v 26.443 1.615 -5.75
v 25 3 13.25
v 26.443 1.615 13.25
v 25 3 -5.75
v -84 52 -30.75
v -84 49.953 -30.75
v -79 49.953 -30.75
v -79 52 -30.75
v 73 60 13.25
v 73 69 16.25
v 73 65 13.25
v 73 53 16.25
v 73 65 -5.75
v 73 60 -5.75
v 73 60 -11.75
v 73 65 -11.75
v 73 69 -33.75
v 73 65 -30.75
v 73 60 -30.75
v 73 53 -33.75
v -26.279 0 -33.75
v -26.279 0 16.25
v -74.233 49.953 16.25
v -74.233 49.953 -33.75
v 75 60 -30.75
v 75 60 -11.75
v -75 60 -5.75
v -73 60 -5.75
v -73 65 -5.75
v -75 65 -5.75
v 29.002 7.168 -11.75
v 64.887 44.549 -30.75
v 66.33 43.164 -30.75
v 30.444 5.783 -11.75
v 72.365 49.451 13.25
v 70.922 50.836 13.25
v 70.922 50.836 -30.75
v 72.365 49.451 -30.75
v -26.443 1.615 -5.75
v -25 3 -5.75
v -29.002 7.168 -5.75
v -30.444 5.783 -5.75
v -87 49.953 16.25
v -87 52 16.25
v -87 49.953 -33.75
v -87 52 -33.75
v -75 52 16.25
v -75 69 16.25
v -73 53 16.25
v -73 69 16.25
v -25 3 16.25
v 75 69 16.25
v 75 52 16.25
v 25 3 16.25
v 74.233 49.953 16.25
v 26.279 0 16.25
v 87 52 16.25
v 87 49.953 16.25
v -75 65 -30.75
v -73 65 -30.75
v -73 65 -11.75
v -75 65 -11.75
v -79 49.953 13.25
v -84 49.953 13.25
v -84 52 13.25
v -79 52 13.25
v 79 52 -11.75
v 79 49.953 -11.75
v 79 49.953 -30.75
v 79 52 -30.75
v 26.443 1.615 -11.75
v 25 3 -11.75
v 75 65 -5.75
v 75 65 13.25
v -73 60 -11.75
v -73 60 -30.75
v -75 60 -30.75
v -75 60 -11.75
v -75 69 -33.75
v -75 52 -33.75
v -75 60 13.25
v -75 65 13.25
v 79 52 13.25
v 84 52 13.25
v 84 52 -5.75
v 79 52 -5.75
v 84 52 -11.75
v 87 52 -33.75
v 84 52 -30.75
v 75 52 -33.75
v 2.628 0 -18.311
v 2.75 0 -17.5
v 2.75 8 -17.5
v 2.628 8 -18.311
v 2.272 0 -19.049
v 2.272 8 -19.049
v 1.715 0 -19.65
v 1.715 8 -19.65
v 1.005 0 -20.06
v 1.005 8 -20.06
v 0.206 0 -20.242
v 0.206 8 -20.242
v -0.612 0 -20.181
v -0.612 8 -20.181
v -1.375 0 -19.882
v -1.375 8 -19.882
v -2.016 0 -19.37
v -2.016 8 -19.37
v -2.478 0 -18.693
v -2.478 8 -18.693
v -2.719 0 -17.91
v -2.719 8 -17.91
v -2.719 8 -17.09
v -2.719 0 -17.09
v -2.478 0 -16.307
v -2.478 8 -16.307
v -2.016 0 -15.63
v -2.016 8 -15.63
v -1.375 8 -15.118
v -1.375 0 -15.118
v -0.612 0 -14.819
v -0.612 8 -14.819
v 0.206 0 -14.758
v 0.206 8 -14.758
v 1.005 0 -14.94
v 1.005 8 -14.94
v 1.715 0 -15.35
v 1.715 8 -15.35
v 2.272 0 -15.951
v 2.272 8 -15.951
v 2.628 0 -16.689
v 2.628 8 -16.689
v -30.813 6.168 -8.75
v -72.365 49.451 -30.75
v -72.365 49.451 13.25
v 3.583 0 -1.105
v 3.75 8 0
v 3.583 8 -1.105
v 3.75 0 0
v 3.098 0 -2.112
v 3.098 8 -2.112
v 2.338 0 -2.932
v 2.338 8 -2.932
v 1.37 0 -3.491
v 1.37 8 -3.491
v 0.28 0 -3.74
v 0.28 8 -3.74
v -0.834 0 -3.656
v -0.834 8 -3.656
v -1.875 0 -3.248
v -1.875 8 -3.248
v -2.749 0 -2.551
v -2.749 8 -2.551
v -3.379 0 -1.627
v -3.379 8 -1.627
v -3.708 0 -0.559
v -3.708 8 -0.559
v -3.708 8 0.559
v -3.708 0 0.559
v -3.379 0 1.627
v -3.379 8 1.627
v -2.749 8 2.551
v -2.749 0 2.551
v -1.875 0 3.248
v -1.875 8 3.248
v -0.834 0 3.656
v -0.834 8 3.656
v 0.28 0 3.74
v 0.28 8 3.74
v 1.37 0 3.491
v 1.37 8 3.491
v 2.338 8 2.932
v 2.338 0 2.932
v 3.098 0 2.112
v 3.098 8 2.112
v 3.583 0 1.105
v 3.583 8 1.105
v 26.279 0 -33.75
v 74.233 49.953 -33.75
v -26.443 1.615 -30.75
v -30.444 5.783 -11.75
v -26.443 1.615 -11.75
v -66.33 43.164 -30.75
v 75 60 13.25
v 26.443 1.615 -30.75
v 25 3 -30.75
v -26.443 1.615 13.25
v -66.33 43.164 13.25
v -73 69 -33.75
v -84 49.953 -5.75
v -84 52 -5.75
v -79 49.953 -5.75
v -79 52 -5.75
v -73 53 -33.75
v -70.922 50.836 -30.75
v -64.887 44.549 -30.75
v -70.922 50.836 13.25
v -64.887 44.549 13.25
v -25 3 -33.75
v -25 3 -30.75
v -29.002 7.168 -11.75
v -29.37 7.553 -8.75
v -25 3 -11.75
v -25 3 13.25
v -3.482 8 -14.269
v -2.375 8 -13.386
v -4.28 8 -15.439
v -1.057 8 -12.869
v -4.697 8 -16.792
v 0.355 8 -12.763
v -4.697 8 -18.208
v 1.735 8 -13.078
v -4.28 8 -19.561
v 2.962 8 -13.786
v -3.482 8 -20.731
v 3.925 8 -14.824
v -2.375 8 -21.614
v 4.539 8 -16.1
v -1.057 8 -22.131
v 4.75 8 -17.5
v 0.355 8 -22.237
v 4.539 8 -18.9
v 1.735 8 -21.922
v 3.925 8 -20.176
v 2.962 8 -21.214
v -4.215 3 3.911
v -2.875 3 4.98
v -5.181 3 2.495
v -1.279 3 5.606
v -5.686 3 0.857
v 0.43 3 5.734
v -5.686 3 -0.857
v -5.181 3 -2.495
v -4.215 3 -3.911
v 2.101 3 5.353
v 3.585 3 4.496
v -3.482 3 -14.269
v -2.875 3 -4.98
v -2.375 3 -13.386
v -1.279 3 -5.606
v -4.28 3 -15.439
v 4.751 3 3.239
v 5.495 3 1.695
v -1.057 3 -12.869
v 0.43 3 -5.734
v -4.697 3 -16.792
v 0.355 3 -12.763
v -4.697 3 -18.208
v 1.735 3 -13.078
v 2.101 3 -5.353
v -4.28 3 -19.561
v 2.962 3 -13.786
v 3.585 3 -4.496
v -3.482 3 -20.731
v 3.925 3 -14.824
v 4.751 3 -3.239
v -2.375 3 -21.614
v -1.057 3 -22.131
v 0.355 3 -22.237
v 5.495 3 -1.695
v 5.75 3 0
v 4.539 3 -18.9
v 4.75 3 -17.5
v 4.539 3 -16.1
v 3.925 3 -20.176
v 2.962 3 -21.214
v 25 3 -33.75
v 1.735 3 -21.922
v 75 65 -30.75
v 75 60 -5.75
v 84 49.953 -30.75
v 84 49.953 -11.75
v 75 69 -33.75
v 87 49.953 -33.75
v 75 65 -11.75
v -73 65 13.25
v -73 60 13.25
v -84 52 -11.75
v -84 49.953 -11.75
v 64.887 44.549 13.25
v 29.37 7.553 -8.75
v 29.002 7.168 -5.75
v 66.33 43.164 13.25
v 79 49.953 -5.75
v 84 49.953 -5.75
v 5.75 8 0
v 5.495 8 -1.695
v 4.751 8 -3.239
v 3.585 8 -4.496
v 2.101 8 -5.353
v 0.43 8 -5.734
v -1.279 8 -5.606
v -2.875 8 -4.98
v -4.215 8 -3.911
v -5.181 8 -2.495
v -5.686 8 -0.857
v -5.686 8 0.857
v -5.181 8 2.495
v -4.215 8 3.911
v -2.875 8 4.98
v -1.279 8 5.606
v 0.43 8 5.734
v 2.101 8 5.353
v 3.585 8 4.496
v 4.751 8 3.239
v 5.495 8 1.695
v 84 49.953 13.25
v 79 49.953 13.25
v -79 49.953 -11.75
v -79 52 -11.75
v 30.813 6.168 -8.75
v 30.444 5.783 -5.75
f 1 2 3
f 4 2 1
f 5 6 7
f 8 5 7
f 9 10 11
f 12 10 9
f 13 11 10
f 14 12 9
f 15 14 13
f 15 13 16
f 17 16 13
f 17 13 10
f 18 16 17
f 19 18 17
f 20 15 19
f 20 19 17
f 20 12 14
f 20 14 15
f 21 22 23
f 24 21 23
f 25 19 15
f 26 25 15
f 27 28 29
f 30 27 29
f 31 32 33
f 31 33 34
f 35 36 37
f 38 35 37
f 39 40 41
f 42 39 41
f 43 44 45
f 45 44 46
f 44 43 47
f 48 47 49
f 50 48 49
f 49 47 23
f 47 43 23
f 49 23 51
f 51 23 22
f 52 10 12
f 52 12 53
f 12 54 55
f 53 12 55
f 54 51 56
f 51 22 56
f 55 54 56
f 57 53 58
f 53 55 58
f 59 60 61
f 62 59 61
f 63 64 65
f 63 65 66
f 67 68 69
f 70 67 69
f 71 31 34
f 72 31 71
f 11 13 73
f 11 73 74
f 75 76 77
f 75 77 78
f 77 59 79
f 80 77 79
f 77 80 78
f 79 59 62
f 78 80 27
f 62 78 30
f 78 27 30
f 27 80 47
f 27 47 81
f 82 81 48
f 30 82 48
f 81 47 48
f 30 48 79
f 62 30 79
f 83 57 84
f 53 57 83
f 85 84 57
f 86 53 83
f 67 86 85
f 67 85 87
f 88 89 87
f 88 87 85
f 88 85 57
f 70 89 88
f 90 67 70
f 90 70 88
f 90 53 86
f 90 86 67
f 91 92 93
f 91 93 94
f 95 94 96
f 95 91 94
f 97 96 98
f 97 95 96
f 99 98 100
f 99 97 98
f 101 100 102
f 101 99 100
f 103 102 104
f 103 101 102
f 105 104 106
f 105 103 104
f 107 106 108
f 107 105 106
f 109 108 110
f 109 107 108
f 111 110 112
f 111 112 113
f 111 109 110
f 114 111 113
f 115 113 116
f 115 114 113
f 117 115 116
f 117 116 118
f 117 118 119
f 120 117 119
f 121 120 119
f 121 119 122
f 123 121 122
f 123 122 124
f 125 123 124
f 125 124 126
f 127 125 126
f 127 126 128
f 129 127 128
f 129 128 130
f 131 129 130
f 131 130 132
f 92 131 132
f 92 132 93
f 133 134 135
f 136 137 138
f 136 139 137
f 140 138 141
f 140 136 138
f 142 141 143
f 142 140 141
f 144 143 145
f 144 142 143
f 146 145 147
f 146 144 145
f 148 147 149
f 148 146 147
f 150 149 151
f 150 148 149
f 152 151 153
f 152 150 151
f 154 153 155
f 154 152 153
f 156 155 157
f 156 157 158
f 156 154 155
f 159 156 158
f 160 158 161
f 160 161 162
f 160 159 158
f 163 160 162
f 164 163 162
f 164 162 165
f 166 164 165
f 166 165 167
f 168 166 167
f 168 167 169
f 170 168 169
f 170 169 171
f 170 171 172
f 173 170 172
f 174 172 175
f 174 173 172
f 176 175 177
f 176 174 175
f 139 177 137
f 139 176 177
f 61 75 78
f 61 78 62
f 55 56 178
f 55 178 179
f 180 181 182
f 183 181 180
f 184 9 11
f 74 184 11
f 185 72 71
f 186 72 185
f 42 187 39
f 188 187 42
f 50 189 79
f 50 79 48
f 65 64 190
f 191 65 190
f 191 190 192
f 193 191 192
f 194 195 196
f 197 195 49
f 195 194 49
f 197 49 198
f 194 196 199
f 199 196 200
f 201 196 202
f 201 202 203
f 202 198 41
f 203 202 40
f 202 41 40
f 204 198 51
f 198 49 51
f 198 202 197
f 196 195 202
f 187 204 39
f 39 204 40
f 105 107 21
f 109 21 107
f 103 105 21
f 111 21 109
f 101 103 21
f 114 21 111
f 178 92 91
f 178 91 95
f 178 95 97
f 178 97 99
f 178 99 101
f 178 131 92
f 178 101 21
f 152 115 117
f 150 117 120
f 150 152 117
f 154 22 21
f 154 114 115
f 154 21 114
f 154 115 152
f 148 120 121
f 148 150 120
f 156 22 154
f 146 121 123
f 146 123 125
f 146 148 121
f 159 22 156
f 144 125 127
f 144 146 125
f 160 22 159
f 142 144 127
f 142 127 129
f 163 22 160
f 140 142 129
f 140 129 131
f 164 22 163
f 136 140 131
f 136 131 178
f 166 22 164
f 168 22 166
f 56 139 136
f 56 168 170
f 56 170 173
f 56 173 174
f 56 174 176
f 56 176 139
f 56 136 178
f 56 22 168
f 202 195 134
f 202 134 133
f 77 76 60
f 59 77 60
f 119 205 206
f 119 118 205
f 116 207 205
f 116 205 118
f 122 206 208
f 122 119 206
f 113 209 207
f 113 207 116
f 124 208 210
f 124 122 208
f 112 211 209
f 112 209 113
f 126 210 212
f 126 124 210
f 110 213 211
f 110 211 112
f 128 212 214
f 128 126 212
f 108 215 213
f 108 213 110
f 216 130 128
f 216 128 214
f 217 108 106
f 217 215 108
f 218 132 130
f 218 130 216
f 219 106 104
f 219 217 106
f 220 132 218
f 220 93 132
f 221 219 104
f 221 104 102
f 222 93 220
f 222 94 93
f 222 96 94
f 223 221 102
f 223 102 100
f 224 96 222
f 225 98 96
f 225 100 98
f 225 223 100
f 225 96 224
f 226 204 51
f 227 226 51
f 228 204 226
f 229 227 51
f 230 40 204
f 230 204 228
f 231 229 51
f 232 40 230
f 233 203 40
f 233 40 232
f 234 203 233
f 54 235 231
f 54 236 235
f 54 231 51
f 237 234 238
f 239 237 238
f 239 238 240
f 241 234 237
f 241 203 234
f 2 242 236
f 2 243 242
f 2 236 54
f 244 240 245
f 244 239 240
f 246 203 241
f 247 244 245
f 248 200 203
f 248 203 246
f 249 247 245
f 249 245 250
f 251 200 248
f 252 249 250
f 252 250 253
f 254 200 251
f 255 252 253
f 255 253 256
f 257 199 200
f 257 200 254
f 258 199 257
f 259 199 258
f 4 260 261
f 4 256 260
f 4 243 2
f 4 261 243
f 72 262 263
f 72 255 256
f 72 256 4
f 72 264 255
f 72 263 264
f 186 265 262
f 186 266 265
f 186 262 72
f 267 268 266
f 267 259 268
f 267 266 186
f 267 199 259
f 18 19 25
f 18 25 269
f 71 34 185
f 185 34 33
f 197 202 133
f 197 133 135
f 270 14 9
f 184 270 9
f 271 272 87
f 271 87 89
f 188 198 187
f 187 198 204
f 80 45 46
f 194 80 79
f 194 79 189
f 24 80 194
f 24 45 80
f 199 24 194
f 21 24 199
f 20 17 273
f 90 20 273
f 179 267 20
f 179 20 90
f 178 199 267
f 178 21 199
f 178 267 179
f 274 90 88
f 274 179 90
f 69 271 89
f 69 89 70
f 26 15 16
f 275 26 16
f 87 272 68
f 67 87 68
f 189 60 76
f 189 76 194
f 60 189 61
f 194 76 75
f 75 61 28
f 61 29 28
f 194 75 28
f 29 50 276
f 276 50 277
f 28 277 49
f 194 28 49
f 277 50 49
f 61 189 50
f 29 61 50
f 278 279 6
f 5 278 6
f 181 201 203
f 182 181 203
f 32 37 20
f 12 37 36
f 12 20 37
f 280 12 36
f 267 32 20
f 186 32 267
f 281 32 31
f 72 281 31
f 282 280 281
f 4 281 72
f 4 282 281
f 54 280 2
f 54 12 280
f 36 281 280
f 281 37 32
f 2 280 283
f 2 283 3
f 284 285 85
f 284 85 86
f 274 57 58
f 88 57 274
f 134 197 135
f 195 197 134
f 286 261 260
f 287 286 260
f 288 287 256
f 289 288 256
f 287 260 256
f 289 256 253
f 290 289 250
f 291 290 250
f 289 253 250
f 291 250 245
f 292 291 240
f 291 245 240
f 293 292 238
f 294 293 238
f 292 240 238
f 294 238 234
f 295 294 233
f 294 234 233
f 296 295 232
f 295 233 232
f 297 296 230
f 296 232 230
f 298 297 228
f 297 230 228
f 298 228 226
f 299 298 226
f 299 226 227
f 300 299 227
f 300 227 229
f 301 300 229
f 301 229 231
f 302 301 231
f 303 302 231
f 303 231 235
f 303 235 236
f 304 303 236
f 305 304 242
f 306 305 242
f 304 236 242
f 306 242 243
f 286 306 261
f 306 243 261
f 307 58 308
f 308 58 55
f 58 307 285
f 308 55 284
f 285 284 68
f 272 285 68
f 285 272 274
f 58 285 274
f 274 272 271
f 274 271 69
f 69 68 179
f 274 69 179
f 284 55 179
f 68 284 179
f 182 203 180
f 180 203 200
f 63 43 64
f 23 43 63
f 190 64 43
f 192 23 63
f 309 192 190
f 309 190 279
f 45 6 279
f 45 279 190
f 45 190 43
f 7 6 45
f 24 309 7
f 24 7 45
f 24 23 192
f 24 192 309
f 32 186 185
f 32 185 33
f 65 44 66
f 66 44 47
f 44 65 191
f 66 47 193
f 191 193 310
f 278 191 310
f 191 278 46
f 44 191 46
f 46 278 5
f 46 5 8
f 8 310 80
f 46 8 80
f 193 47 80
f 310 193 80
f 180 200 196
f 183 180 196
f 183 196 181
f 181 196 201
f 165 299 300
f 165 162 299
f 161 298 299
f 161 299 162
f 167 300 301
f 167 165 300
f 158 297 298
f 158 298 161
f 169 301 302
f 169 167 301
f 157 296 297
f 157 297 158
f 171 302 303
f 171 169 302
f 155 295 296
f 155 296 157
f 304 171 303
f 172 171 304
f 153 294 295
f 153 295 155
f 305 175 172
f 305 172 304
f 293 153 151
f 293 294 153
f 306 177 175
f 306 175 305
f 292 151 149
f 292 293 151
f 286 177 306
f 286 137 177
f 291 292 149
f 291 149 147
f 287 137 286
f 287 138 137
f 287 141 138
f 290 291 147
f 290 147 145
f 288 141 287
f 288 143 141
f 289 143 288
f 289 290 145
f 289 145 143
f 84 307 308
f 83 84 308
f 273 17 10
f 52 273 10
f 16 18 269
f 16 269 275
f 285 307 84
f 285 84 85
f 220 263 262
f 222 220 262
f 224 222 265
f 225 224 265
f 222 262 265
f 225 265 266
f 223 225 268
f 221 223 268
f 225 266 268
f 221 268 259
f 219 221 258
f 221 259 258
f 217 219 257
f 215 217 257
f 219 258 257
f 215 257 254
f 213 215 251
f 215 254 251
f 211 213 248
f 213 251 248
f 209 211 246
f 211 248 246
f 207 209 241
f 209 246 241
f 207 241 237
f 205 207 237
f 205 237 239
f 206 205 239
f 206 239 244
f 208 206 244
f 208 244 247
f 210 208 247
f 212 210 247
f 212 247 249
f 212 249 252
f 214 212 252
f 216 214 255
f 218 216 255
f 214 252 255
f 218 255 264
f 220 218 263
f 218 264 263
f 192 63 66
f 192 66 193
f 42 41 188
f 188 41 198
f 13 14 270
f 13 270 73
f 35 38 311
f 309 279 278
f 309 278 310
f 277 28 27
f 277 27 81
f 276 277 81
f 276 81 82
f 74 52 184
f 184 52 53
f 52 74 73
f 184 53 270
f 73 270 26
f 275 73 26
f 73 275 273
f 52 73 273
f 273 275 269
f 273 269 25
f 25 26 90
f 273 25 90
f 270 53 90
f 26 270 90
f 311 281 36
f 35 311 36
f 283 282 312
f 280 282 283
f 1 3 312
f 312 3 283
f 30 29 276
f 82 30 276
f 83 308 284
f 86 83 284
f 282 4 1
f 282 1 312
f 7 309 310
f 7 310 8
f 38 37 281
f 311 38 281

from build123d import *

# Parameters (mm, degrees)
SKETCH1_W               = 50
SKETCH1_H               = 50
SKETCH1_R               = 3.75
SKETCH1_R_2             = 2.75
BOSS_EXTRUDE1_DEPTH     = 3
BOSS_EXTRUDE2_DEPTH     = 50
CUT_EXTRUDE2_DEPTH      = 2
SKETCH10_W              = 50
SKETCH10_H              = 2.047418662
BOSS_EXTRUDE6_DEPTH     = 2
SKETCH11_W              = 5
SKETCH11_H              = 19
CUT_EXTRUDE4_DEPTH      = 4
SKETCH12_W              = 2
SKETCH12_H              = 50
BOSS_EXTRUDE7_DEPTH     = 10
SKETCH13_W              = 19
SKETCH13_H              = 5
CUT_EXTRUDE5_DEPTH      = 10
SKETCH14_R              = 5.75
SKETCH14_R_2            = 3.75
SKETCH14_R_3            = 4.75
SKETCH14_R_4            = 2.75
BOSS_EXTRUDE8_DEPTH     = 5
SKETCH15_W              = 50
SKETCH15_H              = 3
CUT_EXTRUDE6_DEPTH      = 161
CUT_EXTRUDE6_DEPTH_BACK = 15


with BuildPart() as part:
    # Sketch1 → Boss-Extrude1 (new body)
    with BuildSketch(Plane(origin=(0, 0, 0), x_dir=(1, 0, 0), z_dir=(0, 1, 0))):
        with Locations((0, 8.75)):
            Rectangle(SKETCH1_W, SKETCH1_H)
        Circle(SKETCH1_R, mode=Mode.SUBTRACT)
        with Locations((0, 17.5)):
            Circle(SKETCH1_R_2, mode=Mode.SUBTRACT)
    extrude(amount=BOSS_EXTRUDE1_DEPTH)

    # Sketch2 → Boss-Extrude2 (add)
    with BuildSketch(Plane.XY.offset(16.25)):
        Polygon((-25, 0), (-26.278653628, 0), (-74.233131713, 49.952581338), (-85, 49.952581338), (-85, 52), (-75, 52), (-75, 62), (-73, 62), (-73, 53), (-25, 3), align=None)
    boss_extrude2 = extrude(amount=-BOSS_EXTRUDE2_DEPTH)

    # Sketch3 → Cut-Extrude2 (cut)
    with BuildSketch(Plane(origin=(-11.511240633, -11.050791007, 0), x_dir=(0, 0, -1), z_dir=(0.721387321, 0.692531828, 0))):
        Polygon((-13.25, 85.788351472), (30.75, 85.788351472), (8.75, 25.788351472), align=None)
        Polygon((30.75, 77.073872213), (11.75, 25.255690395), (11.75, 19.477457668), (30.75, 19.477457668), (30.75, 22.897932802), align=None)
        Polygon((-13.25, 77.073872213), (-13.25, 19.477457668), (5.75, 19.477457668), (5.75, 25.255690395), align=None)
    cut_extrude2 = extrude(amount=-CUT_EXTRUDE2_DEPTH, mode=Mode.SUBTRACT)

    # Mirror1: Boss-Extrude2, Cut-Extrude2 across plane
    add(boss_extrude2.mirror(Plane(origin=(0, 0, 0), x_dir=(0, 0, 1), z_dir=(1, 0, 0))))
    add(cut_extrude2.mirror(Plane(origin=(0, 0, 0), x_dir=(0, 0, 1), z_dir=(1, 0, 0))), mode=Mode.SUBTRACT)

    # Sketch10 → Boss-Extrude6 (add)
    with BuildSketch(Plane(origin=(85, 0, 0), x_dir=(0, 0, -1), z_dir=(1, 0, 0))):
        with Locations((8.75, 50.976290669)):
            Rectangle(SKETCH10_W, SKETCH10_H)
    boss_extrude6 = extrude(amount=BOSS_EXTRUDE6_DEPTH)

    # Sketch11 → Cut-Extrude4 (cut)
    with BuildSketch(Plane(origin=(0, 49.952581338, 0), x_dir=(-1, 0, 0), z_dir=(0, -1, 0))):
        with Locations((-81.5, -3.75)):
            Rectangle(SKETCH11_W, SKETCH11_H)
        with Locations((-81.5, 21.25)):
            Rectangle(SKETCH11_W, SKETCH11_H)
    cut_extrude4 = extrude(amount=-CUT_EXTRUDE4_DEPTH, mode=Mode.SUBTRACT)

    # Mirror2: Boss-Extrude6, Cut-Extrude4 across plane
    add(boss_extrude6.mirror(Plane(origin=(0, 0, 0), x_dir=(0, 0, 1), z_dir=(1, 0, 0))))
    add(cut_extrude4.mirror(Plane(origin=(0, 0, 0), x_dir=(0, 0, 1), z_dir=(1, 0, 0))), mode=Mode.SUBTRACT)

    # Sketch12 → Boss-Extrude7 (add)
    with BuildSketch(Plane(origin=(0, 62, 0), x_dir=(1, 0, 0), z_dir=(0, 1, 0))):
        with Locations((74, 8.75)):
            Rectangle(SKETCH12_W, SKETCH12_H)
        with Locations((-74, 8.75)):
            Rectangle(SKETCH12_W, SKETCH12_H)
    extrude(amount=BOSS_EXTRUDE7_DEPTH)

    # Sketch13 → Cut-Extrude5 (cut)
    with BuildSketch(Plane.ZY.offset(-73)):
        with Locations((-21.25, 62.5)):
            Rectangle(SKETCH13_W, SKETCH13_H)
        with Locations((3.75, 62.5)):
            Rectangle(SKETCH13_W, SKETCH13_H)
    cut_extrude5 = extrude(amount=-CUT_EXTRUDE5_DEPTH, mode=Mode.SUBTRACT)

    # Mirror3: Cut-Extrude5 across plane
    add(cut_extrude5.mirror(Plane(origin=(0, 0, 0), x_dir=(0, 0, 1), z_dir=(1, 0, 0))), mode=Mode.SUBTRACT)

    # Sketch14 → Boss-Extrude8 (add)
    with BuildSketch(Plane(origin=(0, 3, 0), x_dir=(1, 0, 0), z_dir=(0, 1, 0))):
        Circle(SKETCH14_R)
        Circle(SKETCH14_R_2, mode=Mode.SUBTRACT)
        with Locations((0, 17.5)):
            Circle(SKETCH14_R_3)
        with Locations((0, 17.5)):
            Circle(SKETCH14_R_4, mode=Mode.SUBTRACT)
    extrude(amount=BOSS_EXTRUDE8_DEPTH)

    # Sketch15 → Cut-Extrude6 (cut, two sides)
    with BuildSketch(Plane.ZY.offset(-73)) as cut_extrude6_sk:
        with Locations((-8.75, 70.5)):
            Rectangle(SKETCH15_W, SKETCH15_H)
    extrude(amount=CUT_EXTRUDE6_DEPTH, mode=Mode.SUBTRACT)
    extrude(cut_extrude6_sk.sketch, amount=-CUT_EXTRUDE6_DEPTH_BACK, mode=Mode.SUBTRACT)


solid = part.part
